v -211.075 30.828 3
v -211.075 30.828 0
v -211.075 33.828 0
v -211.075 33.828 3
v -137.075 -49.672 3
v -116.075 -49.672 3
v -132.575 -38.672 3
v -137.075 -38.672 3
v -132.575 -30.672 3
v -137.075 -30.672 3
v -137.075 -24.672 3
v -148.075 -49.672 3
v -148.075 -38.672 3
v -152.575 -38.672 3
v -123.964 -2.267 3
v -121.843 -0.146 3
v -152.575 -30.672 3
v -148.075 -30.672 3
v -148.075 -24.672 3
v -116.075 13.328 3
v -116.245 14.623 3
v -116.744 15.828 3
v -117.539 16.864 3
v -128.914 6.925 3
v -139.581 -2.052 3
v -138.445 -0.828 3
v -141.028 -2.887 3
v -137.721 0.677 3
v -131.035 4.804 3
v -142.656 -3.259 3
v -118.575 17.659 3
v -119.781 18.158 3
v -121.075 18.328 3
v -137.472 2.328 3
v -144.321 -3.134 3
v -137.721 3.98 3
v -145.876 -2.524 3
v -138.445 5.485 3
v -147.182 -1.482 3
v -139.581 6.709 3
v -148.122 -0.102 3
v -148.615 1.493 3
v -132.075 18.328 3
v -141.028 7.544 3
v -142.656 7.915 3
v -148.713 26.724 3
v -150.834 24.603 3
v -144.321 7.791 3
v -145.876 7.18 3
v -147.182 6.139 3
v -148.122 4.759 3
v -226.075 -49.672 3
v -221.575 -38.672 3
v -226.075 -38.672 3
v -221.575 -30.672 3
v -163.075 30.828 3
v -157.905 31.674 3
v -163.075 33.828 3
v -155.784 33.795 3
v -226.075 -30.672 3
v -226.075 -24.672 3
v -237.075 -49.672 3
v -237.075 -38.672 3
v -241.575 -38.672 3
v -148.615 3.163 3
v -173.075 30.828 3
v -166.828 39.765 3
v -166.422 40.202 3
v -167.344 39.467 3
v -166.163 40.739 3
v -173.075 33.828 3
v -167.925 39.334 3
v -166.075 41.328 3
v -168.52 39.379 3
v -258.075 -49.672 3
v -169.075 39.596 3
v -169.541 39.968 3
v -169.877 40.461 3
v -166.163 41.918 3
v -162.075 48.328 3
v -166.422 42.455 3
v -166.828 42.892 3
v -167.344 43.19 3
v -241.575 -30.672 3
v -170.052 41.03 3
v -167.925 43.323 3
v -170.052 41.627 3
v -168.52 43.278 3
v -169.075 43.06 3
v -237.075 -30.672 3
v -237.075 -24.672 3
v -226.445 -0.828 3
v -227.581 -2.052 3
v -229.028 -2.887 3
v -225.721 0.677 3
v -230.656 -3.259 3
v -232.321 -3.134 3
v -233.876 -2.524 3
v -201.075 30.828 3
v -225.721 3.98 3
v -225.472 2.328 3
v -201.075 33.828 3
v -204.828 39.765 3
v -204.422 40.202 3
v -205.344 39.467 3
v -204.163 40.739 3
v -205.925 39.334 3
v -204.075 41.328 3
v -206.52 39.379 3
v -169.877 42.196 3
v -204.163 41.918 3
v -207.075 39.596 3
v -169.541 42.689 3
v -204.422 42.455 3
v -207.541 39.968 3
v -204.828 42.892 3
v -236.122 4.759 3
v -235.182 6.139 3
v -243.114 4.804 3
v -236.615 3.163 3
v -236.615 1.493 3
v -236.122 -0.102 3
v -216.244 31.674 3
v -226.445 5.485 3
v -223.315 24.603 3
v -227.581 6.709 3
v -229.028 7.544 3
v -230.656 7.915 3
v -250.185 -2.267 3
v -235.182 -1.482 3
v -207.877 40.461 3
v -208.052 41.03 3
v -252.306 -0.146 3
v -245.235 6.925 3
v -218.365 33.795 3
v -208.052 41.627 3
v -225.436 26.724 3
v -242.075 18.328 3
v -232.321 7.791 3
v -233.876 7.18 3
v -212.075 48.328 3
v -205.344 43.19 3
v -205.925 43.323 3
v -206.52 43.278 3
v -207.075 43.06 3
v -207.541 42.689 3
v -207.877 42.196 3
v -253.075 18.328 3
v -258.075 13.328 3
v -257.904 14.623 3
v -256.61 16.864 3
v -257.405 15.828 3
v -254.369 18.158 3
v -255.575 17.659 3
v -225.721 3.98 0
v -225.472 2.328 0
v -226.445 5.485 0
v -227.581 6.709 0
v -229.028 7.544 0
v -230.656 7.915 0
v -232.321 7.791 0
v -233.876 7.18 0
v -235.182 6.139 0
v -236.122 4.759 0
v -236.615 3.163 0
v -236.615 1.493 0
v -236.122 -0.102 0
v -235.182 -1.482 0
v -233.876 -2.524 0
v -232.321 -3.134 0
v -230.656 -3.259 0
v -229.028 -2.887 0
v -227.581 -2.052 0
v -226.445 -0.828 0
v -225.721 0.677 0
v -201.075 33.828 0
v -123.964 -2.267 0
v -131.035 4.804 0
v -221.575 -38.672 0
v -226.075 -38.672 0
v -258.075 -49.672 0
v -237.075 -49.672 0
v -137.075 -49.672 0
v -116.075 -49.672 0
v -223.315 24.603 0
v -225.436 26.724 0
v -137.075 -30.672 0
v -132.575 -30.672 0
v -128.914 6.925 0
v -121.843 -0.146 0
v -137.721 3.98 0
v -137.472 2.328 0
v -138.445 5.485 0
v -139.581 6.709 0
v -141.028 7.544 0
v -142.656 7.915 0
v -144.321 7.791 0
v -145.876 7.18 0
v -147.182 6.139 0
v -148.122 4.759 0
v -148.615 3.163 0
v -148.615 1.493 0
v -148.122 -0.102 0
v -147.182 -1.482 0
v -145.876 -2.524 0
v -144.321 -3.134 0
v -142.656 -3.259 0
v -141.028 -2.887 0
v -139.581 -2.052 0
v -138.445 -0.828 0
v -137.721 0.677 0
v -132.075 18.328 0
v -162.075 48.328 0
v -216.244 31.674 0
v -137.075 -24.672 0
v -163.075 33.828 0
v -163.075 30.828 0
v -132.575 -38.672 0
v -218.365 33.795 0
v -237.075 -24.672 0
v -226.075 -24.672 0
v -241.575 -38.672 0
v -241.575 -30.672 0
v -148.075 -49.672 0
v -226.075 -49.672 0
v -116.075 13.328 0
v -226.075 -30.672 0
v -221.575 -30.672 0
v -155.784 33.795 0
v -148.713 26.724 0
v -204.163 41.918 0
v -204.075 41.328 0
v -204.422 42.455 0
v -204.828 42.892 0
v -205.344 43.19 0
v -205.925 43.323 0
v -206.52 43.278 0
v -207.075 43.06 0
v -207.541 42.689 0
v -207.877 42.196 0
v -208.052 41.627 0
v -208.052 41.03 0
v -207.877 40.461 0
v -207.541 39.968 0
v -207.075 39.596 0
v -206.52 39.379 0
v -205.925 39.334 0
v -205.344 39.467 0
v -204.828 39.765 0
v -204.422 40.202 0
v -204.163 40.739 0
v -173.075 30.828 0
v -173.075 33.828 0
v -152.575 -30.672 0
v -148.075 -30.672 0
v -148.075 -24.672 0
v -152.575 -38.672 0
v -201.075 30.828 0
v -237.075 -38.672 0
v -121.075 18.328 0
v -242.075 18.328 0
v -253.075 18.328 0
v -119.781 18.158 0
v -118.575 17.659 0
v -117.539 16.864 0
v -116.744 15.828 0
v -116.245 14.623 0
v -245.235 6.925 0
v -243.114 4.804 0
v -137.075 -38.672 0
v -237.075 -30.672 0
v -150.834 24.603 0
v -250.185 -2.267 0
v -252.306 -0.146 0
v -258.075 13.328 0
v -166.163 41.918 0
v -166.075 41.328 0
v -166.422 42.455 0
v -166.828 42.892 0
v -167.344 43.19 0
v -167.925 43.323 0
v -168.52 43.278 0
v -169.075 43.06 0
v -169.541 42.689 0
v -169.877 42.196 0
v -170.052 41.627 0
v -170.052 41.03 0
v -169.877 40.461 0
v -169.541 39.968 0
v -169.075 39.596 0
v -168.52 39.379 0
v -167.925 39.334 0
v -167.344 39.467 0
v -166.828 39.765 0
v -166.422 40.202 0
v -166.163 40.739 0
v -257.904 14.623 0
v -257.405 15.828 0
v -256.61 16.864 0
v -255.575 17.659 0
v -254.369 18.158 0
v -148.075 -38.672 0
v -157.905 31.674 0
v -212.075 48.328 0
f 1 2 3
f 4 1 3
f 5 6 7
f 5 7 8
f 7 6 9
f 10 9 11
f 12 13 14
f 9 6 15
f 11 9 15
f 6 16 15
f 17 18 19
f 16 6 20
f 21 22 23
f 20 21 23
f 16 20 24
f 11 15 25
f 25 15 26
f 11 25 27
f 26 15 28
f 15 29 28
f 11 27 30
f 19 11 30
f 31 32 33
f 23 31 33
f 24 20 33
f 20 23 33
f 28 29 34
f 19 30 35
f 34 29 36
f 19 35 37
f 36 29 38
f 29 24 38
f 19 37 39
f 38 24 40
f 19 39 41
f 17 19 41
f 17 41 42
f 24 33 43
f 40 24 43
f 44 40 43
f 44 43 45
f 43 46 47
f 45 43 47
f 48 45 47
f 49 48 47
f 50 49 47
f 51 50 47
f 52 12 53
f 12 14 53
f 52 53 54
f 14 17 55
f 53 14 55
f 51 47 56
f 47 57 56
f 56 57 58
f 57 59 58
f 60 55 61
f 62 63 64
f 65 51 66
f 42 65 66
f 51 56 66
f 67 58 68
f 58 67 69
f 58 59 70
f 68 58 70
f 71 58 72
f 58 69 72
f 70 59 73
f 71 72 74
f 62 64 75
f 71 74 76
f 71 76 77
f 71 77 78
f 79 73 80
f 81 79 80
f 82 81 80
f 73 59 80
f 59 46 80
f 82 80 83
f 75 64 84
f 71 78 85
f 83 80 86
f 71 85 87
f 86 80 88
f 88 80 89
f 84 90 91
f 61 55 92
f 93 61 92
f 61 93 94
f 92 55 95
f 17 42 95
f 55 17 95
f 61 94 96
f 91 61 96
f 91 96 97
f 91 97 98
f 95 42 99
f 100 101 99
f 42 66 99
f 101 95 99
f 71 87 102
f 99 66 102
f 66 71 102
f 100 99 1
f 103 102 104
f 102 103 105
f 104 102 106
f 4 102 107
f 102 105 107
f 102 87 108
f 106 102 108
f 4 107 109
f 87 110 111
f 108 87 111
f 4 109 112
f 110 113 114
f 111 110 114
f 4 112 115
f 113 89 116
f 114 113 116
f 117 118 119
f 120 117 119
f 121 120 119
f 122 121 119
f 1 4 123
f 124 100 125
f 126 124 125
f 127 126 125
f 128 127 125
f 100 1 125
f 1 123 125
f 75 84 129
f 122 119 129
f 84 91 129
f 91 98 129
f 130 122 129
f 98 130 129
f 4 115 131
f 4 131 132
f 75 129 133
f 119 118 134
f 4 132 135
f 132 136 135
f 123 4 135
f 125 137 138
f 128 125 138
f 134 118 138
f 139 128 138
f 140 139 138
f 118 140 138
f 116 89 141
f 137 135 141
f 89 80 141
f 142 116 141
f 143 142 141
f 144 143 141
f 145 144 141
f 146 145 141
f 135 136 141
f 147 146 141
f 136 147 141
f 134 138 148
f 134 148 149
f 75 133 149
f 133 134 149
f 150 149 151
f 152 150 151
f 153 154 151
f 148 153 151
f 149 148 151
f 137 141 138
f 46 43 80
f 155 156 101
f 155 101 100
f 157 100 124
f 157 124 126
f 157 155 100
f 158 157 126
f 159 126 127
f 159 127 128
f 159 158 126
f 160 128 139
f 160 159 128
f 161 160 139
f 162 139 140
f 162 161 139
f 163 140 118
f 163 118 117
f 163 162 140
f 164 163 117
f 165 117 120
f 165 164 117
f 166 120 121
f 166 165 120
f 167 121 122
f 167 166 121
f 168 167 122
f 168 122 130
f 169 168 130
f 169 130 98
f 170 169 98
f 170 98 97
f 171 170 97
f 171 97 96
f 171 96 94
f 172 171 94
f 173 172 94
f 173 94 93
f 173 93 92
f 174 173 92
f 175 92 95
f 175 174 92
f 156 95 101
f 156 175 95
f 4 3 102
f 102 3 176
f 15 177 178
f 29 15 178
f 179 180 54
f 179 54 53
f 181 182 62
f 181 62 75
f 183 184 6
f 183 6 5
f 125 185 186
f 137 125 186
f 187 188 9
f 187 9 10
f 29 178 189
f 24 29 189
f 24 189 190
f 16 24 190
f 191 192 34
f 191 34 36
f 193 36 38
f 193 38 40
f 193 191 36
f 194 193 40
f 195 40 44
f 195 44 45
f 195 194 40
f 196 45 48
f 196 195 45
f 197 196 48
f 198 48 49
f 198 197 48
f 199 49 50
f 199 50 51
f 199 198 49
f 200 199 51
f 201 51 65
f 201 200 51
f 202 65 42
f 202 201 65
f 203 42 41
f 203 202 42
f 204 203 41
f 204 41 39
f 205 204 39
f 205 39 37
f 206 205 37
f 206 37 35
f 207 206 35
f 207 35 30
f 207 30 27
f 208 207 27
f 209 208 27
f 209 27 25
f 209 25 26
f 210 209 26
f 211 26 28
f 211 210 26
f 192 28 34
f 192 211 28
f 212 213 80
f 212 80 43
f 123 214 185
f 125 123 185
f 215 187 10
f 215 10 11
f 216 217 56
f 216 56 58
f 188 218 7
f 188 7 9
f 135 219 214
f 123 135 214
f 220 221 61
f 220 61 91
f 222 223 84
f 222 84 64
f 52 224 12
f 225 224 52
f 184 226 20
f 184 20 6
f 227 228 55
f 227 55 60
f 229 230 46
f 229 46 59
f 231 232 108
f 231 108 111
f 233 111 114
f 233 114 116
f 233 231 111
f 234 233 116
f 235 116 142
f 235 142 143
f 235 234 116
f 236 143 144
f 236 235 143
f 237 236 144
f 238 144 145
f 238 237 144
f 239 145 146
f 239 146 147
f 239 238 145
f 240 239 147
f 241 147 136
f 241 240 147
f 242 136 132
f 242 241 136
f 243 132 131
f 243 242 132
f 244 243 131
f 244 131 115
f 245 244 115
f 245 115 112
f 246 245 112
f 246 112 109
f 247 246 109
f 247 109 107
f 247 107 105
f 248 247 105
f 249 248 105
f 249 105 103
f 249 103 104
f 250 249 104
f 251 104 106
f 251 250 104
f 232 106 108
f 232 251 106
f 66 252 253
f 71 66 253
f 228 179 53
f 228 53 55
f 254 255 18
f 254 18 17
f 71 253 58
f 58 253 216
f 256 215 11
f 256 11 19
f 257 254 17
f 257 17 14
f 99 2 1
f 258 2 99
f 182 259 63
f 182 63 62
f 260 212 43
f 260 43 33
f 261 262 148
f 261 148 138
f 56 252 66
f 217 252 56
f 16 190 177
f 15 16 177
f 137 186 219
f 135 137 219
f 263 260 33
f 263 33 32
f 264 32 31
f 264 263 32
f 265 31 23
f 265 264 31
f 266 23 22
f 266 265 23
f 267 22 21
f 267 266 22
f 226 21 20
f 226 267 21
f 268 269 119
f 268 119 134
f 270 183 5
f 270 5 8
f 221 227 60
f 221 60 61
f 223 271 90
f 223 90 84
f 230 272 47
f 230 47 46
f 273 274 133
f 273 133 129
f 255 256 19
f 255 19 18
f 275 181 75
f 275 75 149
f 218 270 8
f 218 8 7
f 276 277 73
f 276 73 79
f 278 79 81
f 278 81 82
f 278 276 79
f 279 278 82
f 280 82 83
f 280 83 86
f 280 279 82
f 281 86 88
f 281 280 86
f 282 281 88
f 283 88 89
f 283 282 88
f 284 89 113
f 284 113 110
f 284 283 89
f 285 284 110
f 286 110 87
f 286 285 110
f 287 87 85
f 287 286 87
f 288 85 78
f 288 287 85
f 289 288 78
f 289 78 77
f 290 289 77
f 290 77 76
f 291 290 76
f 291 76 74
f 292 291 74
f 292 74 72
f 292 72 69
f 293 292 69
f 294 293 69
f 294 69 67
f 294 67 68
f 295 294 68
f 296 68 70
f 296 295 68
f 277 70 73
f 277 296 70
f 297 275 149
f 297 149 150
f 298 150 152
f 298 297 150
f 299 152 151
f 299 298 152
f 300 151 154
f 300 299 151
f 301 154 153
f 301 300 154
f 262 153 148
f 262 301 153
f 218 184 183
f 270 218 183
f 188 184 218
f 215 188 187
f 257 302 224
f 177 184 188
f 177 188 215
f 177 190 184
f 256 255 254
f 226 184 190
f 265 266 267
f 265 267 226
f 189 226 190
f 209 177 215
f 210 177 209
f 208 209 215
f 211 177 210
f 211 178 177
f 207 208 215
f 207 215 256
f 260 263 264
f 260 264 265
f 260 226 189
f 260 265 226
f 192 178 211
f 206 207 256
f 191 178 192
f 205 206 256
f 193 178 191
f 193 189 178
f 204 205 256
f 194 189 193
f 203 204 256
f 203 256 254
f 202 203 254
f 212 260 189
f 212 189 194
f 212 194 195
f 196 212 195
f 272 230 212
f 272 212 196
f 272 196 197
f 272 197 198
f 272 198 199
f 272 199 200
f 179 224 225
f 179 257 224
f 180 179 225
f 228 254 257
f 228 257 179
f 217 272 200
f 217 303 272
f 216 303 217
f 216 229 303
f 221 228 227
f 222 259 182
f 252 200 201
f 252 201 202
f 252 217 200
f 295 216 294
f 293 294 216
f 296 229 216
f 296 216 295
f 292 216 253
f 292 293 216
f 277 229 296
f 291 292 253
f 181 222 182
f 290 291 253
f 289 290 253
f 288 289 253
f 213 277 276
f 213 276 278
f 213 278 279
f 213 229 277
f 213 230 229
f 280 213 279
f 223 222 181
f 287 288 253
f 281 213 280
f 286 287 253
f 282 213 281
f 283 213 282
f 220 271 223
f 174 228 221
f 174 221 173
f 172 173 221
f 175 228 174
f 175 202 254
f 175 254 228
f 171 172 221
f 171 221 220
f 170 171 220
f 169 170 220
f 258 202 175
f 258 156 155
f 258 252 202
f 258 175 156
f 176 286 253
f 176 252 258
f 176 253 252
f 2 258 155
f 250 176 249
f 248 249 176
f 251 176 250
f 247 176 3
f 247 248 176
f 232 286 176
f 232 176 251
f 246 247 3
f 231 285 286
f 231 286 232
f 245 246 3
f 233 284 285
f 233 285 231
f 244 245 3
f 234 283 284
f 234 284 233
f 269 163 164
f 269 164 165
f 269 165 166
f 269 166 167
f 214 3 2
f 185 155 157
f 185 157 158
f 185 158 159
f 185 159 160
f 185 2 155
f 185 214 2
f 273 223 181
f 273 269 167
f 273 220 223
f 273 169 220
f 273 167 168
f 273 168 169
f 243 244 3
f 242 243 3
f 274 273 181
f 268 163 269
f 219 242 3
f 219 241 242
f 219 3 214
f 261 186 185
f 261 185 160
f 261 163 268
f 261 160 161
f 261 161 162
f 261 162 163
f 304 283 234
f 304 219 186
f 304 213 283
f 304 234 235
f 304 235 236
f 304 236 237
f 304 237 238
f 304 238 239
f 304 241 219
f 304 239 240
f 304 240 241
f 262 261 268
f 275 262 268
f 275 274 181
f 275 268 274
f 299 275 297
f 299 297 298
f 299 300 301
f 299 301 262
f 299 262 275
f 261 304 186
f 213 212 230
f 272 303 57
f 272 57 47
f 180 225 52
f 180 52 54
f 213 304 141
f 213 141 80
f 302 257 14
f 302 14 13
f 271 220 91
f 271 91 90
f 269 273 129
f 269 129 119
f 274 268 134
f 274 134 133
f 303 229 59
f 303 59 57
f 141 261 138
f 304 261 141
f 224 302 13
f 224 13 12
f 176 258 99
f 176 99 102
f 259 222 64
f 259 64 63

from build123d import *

# Parameters (mm, degrees)
MODEL_R                 = 5.602685567
MODEL_R_2               = 2
MODEL_W                 = 10
MODEL_H                 = 3
SALIENTE_EXTRUIR1_DEPTH = 3


with BuildPart() as part:
    # Model → Saliente-Extruir1 (new body)
    with BuildSketch(Plane.XY):
        with BuildLine():
            Line((-237.074609356, -49.671573713), (-258.074609356, -49.671573713))
            Line((-258.074609356, -49.671573713), (-258.074609356, 13.328426287))
            ThreePointArc((-258.074609356, 13.328426287), (-256.610143262, 16.863960193), (-253.074609356, 18.328426287))
            Line((-253.074609356, 18.328426287), (-242.074609356, 18.328426287))
            Line((-242.074609356, 18.328426287), (-212.074609356, 48.328426287))
            Line((-212.074609356, 48.328426287), (-162.074609356, 48.328426287))
            Line((-162.074609356, 48.328426287), (-132.074609356, 18.328426287))
            Line((-132.074609356, 18.328426287), (-121.074609356, 18.328426287))
            ThreePointArc((-121.074609356, 18.328426287), (-117.53907545, 16.863960193), (-116.074609356, 13.328426287))
            Line((-116.074609356, 13.328426287), (-116.074609356, -49.671573713))
            Line((-116.074609356, -49.671573713), (-137.074609356, -49.671573713))
            Line((-137.074609356, -49.671573713), (-137.074609356, -38.671573713))
            Line((-137.074609356, -38.671573713), (-132.574609356, -38.671573713))
            Line((-132.574609356, -38.671573713), (-132.574609356, -30.671573713))
            Line((-132.574609356, -30.671573713), (-137.074609356, -30.671573713))
            Line((-137.074609356, -30.671573713), (-137.074609356, -24.671573713))
            Line((-137.074609356, -24.671573713), (-148.074609356, -24.671573713))
            Line((-148.074609356, -24.671573713), (-148.074609356, -30.671573713))
            Line((-148.074609356, -30.671573713), (-152.574609356, -30.671573713))
            Line((-152.574609356, -30.671573713), (-152.574609356, -38.671573713))
            Line((-152.574609356, -38.671573713), (-148.074609356, -38.671573713))
            Line((-148.074609356, -38.671573713), (-148.074609356, -49.671573713))
            Line((-148.074609356, -49.671573713), (-226.074609356, -49.671573713))
            Line((-226.074609356, -49.671573713), (-226.074609356, -38.671573713))
            Line((-226.074609356, -38.671573713), (-221.574609356, -38.671573713))
            Line((-221.574609356, -38.671573713), (-221.574609356, -30.671573713))
            Line((-221.574609356, -30.671573713), (-226.074609356, -30.671573713))
            Line((-226.074609356, -30.671573713), (-226.074609356, -24.671573713))
            Line((-226.074609356, -24.671573713), (-237.074609356, -24.671573713))
            Line((-237.074609356, -24.671573713), (-237.074609356, -30.671573713))
            Line((-237.074609356, -30.671573713), (-241.574609356, -30.671573713))
            Line((-241.574609356, -30.671573713), (-241.574609356, -38.671573713))
            Line((-241.574609356, -38.671573713), (-237.074609356, -38.671573713))
            Line((-237.074609356, -38.671573713), (-237.074609356, -49.671573713))
        make_face()
        with Locations((-231.074609356, 2.328426287)):
            Circle(MODEL_R, mode=Mode.SUBTRACT)
        with Locations((-143.074609356, 2.328426287)):
            Circle(MODEL_R, mode=Mode.SUBTRACT)
        with Locations((-168.074609356, 41.328426287)):
            Circle(MODEL_R_2, mode=Mode.SUBTRACT)
        with Locations((-206.074609356, 41.328426287)):
            Circle(MODEL_R_2, mode=Mode.SUBTRACT)
        Polygon((-157.905285481, 31.673821038), (-150.834217669, 24.602753226), (-148.712897325, 26.724073569), (-155.783965137, 33.795141381), align=None, mode=Mode.SUBTRACT)
        Polygon((-250.185058728, -2.267304459), (-243.113990916, 4.803763352), (-245.23531126, 6.925083696), (-252.306379072, -0.145984116), align=None, mode=Mode.SUBTRACT)
        with Locations((-206.074609356, 32.328426287)):
            Rectangle(MODEL_W, MODEL_H, mode=Mode.SUBTRACT)
        Polygon((-123.964159984, -2.267304459), (-131.035227796, 4.803763352), (-128.913907452, 6.925083696), (-121.84283964, -0.145984116), align=None, mode=Mode.SUBTRACT)
        Polygon((-216.243933231, 31.673821038), (-223.315001043, 24.602753226), (-225.436321387, 26.724073569), (-218.365253575, 33.795141381), align=None, mode=Mode.SUBTRACT)
        with Locations((-168.074609356, 32.328426287)):
            Rectangle(MODEL_W, MODEL_H, mode=Mode.SUBTRACT)
    extrude(amount=SALIENTE_EXTRUIR1_DEPTH)


solid = part.part
